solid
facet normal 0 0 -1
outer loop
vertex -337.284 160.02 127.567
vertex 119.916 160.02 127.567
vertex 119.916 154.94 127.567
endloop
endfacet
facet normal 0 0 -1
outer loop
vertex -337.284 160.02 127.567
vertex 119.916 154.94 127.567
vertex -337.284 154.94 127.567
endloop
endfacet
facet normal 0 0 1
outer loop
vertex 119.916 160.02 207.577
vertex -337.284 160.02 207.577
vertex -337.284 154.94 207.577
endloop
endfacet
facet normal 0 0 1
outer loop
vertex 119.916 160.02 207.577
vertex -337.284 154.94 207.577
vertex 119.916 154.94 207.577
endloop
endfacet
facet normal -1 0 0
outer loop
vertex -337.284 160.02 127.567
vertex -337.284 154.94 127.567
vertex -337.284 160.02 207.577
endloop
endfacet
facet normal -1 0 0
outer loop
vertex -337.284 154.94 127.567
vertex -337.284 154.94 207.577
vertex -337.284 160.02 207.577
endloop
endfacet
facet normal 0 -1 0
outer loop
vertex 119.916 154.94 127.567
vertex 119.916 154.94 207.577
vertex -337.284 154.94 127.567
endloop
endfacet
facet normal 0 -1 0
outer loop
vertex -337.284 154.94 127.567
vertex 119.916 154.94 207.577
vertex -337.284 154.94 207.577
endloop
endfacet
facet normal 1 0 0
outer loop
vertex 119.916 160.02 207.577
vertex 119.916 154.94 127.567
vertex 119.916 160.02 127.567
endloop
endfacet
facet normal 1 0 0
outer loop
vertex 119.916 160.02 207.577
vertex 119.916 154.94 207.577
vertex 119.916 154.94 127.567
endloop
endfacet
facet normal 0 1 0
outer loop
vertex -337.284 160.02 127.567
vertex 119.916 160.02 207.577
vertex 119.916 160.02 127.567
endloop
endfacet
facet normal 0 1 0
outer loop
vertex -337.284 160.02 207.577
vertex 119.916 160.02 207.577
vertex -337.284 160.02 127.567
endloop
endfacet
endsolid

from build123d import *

# Parameters (mm, degrees)
SKETCH1_W           = 381
SKETCH1_H           = 381
BOSS_EXTRUDE1_DEPTH = 25.4
FILLET1_R           = 25.4
BOSS_EXTRUDE2_START = 127
BOSS_EXTRUDE2_DEPTH = 127
FILLET5_R           = 2.54
FILLET6_R           = 2.54
SKETCH3_W           = 381
SKETCH3_H           = 45.536829563
BOSS_EXTRUDE3_DEPTH = 127
CUT_EXTRUDE1_START  = -127
CUT_EXTRUDE1_DEPTH  = 127
CUT_EXTRUDE2_START  = -127
CUT_EXTRUDE2_DEPTH  = 127
SKETCH7_W           = 159.592910526
SKETCH7_H           = 279.668363548
CUT_EXTRUDE3_DEPTH  = 540.805557869
CUT_EXTRUDE4_DEPTH  = 121.92
SKETCH10_W          = 12.830407975
SKETCH10_H          = 5.381034355
SKETCH10_W_2        = 12.189915085
SKETCH10_H_2        = 7.553204363
BOSS_EXTRUDE4_DEPTH = 5.08
SKETCH12_W          = 381
SKETCH12_H          = 5.08
BOSS_EXTRUDE5_DEPTH = 5.842
SKETCH14_W          = 25.4
SKETCH14_H          = 25.4
BOSS_EXTRUDE6_DEPTH = 5.08
SKETCH15_W          = 381
SKETCH15_H          = 25.4
BOSS_EXTRUDE7_DEPTH = 2.54
SKETCH18_W          = 25.978829563
SKETCH18_H          = 5.08
CUT_EXTRUDE6_DEPTH  = 463.44511455
SKETCH19_W          = 25.4
SKETCH19_H          = 2.54
CUT_EXTRUDE7_DEPTH  = 463.44511455
SKETCH21_W          = 76.2
SKETCH21_H          = 25.4
BOSS_EXTRUDE8_DEPTH = 5.08
SKETCH22_W          = 457.2
SKETCH22_H          = 5.08
BOSS_EXTRUDE9_DEPTH = 54.61


with BuildPart() as part:
    # Sketch1 → Boss-Extrude1 (new body)
    with BuildSketch(Plane(origin=(0, 0, 0), x_dir=(1, 0, 0), z_dir=(0, 1, 0))):
        with Locations((-70.583665339, -17.076693227)):
            Rectangle(SKETCH1_W, SKETCH1_H)
    extrude(amount=BOSS_EXTRUDE1_DEPTH)

    # Fillet1
    fillet1_edges = [part.edges().sort_by_distance(p)[0] for p in [
        (-261.083665339, 12.7, -173.423306773),
        (119.916334661, 12.7, -173.423306773),
        (119.916334661, 12.7, 207.576693227),
        (-261.083665339, 12.7, 207.576693227),
    ]]
    fillet(fillet1_edges, radius=FILLET1_R)

    # Sketch2 → Boss-Extrude2 (add)
    with BuildSketch(Plane(origin=(0, 25.4, 0), x_dir=(1, 0, 0), z_dir=(0, 1, 0)).offset(BOSS_EXTRUDE2_START)):
        with BuildLine():
            ThreePointArc((94.516334661, -207.576693227), (112.476846903, -200.137205469), (119.916334661, -182.176693227))
            Line((119.916334661, -182.176693227), (119.916334661, -162.77058906))
            ThreePointArc((119.916334661, -162.77058906), (115.157902312, -162.131654008), (110.356896004, -162.096230085))
            Line((110.356896004, -162.096230085), (110.356896004, -169.819933243))
            ThreePointArc((110.356896004, -169.819933243), (110.63661406, -173.531591416), (110.356896004, -177.243249589))
            ThreePointArc((110.356896004, -177.243249589), (103.383001842, -191.043360408), (89.582891024, -198.017254569))
            ThreePointArc((89.582891024, -198.017254569), (85.871232851, -198.296972625), (82.159574678, -198.017254569))
            Line((82.159574678, -198.017254569), (74.435871519, -198.017254569))
            ThreePointArc((74.435871519, -198.017254569), (74.471295442, -202.818260878), (75.110230494, -207.576693227))
            Line((75.110230494, -207.576693227), (94.516334661, -207.576693227))
        make_face()
        with BuildLine():
            ThreePointArc((110.356896004, 127.942843631), (115.157902312, 127.978267553), (119.916334661, 128.617202605))
            Line((119.916334661, 128.617202605), (119.916334661, 148.023306773))
            ThreePointArc((119.916334661, 148.023306773), (112.476846903, 165.983819015), (94.516334661, 173.423306773))
            Line((94.516334661, 173.423306773), (75.110230494, 173.423306773))
            ThreePointArc((75.110230494, 173.423306773), (74.471295442, 168.664874423), (74.435871519, 163.863868115))
            Line((74.435871519, 163.863868115), (82.159574678, 163.863868115))
            ThreePointArc((82.159574678, 163.863868115), (85.871232851, 164.143586171), (89.582891024, 163.863868115))
            ThreePointArc((89.582891024, 163.863868115), (103.383001842, 156.889973954), (110.356896004, 143.089863135))
            ThreePointArc((110.356896004, 143.089863135), (110.63661406, 139.378204962), (110.356896004, 135.666546789))
            Line((110.356896004, 135.666546789), (110.356896004, 127.942843631))
        make_face()
        with BuildLine():
            Line((-235.683665339, -207.576693227), (-216.277561171, -207.576693227))
            ThreePointArc((-216.277561171, -207.576693227), (-215.638626119, -202.818260878), (-215.603202197, -198.017254569))
            Line((-215.603202197, -198.017254569), (-223.326905355, -198.017254569))
            ThreePointArc((-223.326905355, -198.017254569), (-227.038563528, -198.296972625), (-230.750221701, -198.017254569))
            ThreePointArc((-230.750221701, -198.017254569), (-244.55033252, -191.043360408), (-251.524226681, -177.243249589))
            ThreePointArc((-251.524226681, -177.243249589), (-251.803944737, -173.531591416), (-251.524226681, -169.819933243))
            Line((-251.524226681, -169.819933243), (-251.524226681, -162.096230085))
            ThreePointArc((-251.524226681, -162.096230085), (-256.325232989, -162.131654008), (-261.083665339, -162.77058906))
            Line((-261.083665339, -162.77058906), (-261.083665339, -182.176693227))
            ThreePointArc((-261.083665339, -182.176693227), (-253.644177581, -200.137205469), (-235.683665339, -207.576693227))
        make_face()
        with BuildLine():
            ThreePointArc((-215.603202197, 163.863868115), (-215.638626119, 168.664874423), (-216.277561171, 173.423306773))
            Line((-216.277561171, 173.423306773), (-235.683665339, 173.423306773))
            ThreePointArc((-235.683665339, 173.423306773), (-253.644177581, 165.983819015), (-261.083665339, 148.023306773))
            Line((-261.083665339, 148.023306773), (-261.083665339, 128.617202605))
            ThreePointArc((-261.083665339, 128.617202605), (-256.325232989, 127.978267553), (-251.524226681, 127.942843631))
            Line((-251.524226681, 127.942843631), (-251.524226681, 135.666546789))
            ThreePointArc((-251.524226681, 135.666546789), (-251.803944737, 139.378204962), (-251.524226681, 143.089863135))
            ThreePointArc((-251.524226681, 143.089863135), (-244.55033252, 156.889973954), (-230.750221701, 163.863868115))
            ThreePointArc((-230.750221701, 163.863868115), (-227.038563528, 164.143586171), (-223.326905355, 163.863868115))
            Line((-223.326905355, 163.863868115), (-215.603202197, 163.863868115))
        make_face()
    extrude(amount=-BOSS_EXTRUDE2_DEPTH)

    # Fillet5
    fillet5_edges = [part.edges().sort_by_distance(p)[0] for p in [
        (74.435871519, 88.9, -163.863868115),
        (110.356896004, 88.9, -127.942843631),
        (119.916334661, 88.9, -128.617202605),
        (75.110230494, 88.9, -173.423306773),
    ]]
    fillet(fillet5_edges, radius=FILLET5_R)

    # Fillet6
    fillet6_edges = [part.edges().sort_by_distance(p)[0] for p in [
        (-215.603202197, 88.9, -163.863868115),
        (-216.277561171, 88.9, -173.423306773),
        (-261.083665339, 88.9, -128.617202605),
        (-251.524226681, 88.9, -127.942843631),
        (74.435871519, 88.9, 198.017254569),
        (75.110230494, 88.9, 207.576693227),
        (119.916334661, 88.9, 162.77058906),
        (110.356896004, 88.9, 162.096230085),
        (-216.277561171, 88.9, 207.576693227),
        (-215.603202197, 88.9, 198.017254569),
        (-251.524226681, 88.9, 162.096230085),
        (-261.083665339, 88.9, 162.77058906),
    ]]
    fillet(fillet6_edges, radius=FILLET6_R)

    # Sketch3 → Boss-Extrude3 (add)
    with BuildSketch(Plane(origin=(0, 152.4, 0), x_dir=(1, 0, 0), z_dir=(0, 1, 0))):
        with Locations((-70.583665339, -184.808278446)):
            Rectangle(SKETCH3_W, SKETCH3_H)
    extrude(amount=BOSS_EXTRUDE3_DEPTH)

    # Sketch5 → Cut-Extrude1 (cut)
    with BuildSketch(Plane.XZ.offset(-152.4).offset(CUT_EXTRUDE1_START)):
        with BuildLine():
            Line((-261.083665339, 162.039863664), (-261.083665339, 164.916350572))
            ThreePointArc((-261.083665339, 164.916350572), (-260.459455915, 163.248613642), (-258.89362875, 162.400575222))
            ThreePointArc((-258.89362875, 162.400575222), (-256.499630965, 162.144358959), (-254.094230188, 162.039863664))
            Line((-254.094230188, 162.039863664), (-261.083665339, 162.039863664))
        make_face()
        with BuildLine():
            Line((-261.083665339, 207.576693227), (-235.683665339, 207.576693227))
            ThreePointArc((-235.683665339, 207.576693227), (-253.644177581, 200.137205469), (-261.083665339, 182.176693227))
            Line((-261.083665339, 182.176693227), (-261.083665339, 207.576693227))
        make_face()
    extrude(amount=CUT_EXTRUDE1_DEPTH, mode=Mode.SUBTRACT)

    # Sketch6 → Cut-Extrude2 (cut)
    with BuildSketch(Plane.XZ.offset(-152.4).offset(CUT_EXTRUDE2_START)):
        with BuildLine():
            Line((119.916334661, 162.039863664), (112.926899511, 162.039863664))
            ThreePointArc((112.926899511, 162.039863664), (115.332300288, 162.144358959), (117.726298073, 162.400575222))
            ThreePointArc((117.726298073, 162.400575222), (119.292125238, 163.248613642), (119.916334661, 164.916350572))
            Line((119.916334661, 164.916350572), (119.916334661, 162.039863664))
        make_face()
        with BuildLine():
            Line((119.916334661, 207.576693227), (119.916334661, 182.176693227))
            ThreePointArc((119.916334661, 182.176693227), (112.476846903, 200.137205469), (94.516334661, 207.576693227))
            Line((94.516334661, 207.576693227), (119.916334661, 207.576693227))
        make_face()
    extrude(amount=CUT_EXTRUDE2_DEPTH, mode=Mode.SUBTRACT)

    # Sketch7 → Cut-Extrude3 (cut, through all)
    with BuildSketch(Plane.XY.offset(207.576693227)):
        with Locations((-277.192611624, 12.565818226)):
            Rectangle(SKETCH7_W, SKETCH7_H)
        Polygon((188.205407311, 152.4), (-197.396156361, 152.4), (-197.396156361, -127.268363548), (-197.396156361, -138.930106511), (188.205407311, -138.930106511), align=None)
    extrude(amount=-CUT_EXTRUDE3_DEPTH, mode=Mode.SUBTRACT)

    # Sketch9 → Cut-Extrude4 (cut)
    with BuildSketch(Plane(origin=(0, 279.4, 0), x_dir=(1, 0, 0), z_dir=(0, 1, 0))):
        with BuildLine():
            Line((112.926899511, -162.039863664), (-254.094230188, -162.039863664))
            ThreePointArc((-254.094230188, -162.039863664), (-256.499630965, -162.144358959), (-258.89362875, -162.400575222))
            ThreePointArc((-258.89362875, -162.400575222), (-260.459455915, -163.248613642), (-261.083665339, -164.916350572))
            Line((-261.083665339, -164.916350572), (-261.083665339, -182.176693227))
            ThreePointArc((-261.083665339, -182.176693227), (-253.644177581, -200.137205469), (-235.683665339, -207.576693227))
            Line((-235.683665339, -207.576693227), (94.516334661, -207.576693227))
            ThreePointArc((94.516334661, -207.576693227), (112.476846903, -200.137205469), (119.916334661, -182.176693227))
            Line((119.916334661, -182.176693227), (119.916334661, -164.916350572))
            ThreePointArc((119.916334661, -164.916350572), (119.292125238, -163.248613642), (117.726298073, -162.400575222))
            ThreePointArc((117.726298073, -162.400575222), (115.332300288, -162.144358959), (112.926899511, -162.039863664))
        make_face()
    extrude(amount=-CUT_EXTRUDE4_DEPTH, mode=Mode.SUBTRACT)

    # Sketch10 → Boss-Extrude4 (add)
    with BuildSketch(Plane(origin=(0, 157.48, 0), x_dir=(1, 0, 0), z_dir=(0, 1, 0))):
        with Locations((-254.668461352, -164.730380842)):
            Rectangle(SKETCH10_W, SKETCH10_H)
        with Locations((113.821377119, -165.816465846)):
            Rectangle(SKETCH10_W_2, SKETCH10_H_2)
    extrude(amount=-BOSS_EXTRUDE4_DEPTH)

    # Sketch12 → Boss-Extrude5 (add)
    with BuildSketch(Plane(origin=(0, 0, 162.039863664), x_dir=(-1, 0, 0), z_dir=(0, 0, -1))):
        with Locations((70.583665339, 154.94)):
            Rectangle(SKETCH12_W, SKETCH12_H)
    extrude(amount=BOSS_EXTRUDE5_DEPTH)

    # Sketch14 → Boss-Extrude6 (add)
    with BuildSketch(Plane(origin=(0, 157.48, 0), x_dir=(1, 0, 0), z_dir=(0, 1, 0))):
        with Locations((107.216334661, -194.876693227)):
            Rectangle(SKETCH14_W, SKETCH14_H)
        with Locations((-248.383665339, -194.876693227)):
            Rectangle(SKETCH14_W, SKETCH14_H)
    extrude(amount=-BOSS_EXTRUDE6_DEPTH)

    # Sketch15 → Boss-Extrude7 (add)
    with BuildSketch(Plane(origin=(0, 157.48, 0), x_dir=(1, 0, 0), z_dir=(0, 1, 0))):
        with Locations((-70.583665339, -194.876693227)):
            Rectangle(SKETCH15_W, SKETCH15_H)
    extrude(amount=BOSS_EXTRUDE7_DEPTH)

    # Sketch18 → Cut-Extrude6 (cut, through all)
    with BuildSketch(Plane.ZY.offset(261.083665339)):
        with Locations((169.187278445, 154.94)):
            Rectangle(SKETCH18_W, SKETCH18_H)
    extrude(amount=-CUT_EXTRUDE6_DEPTH, mode=Mode.SUBTRACT)

    # Sketch19 → Cut-Extrude7 (cut, through all)
    with BuildSketch(Plane.ZY.offset(261.083665339)):
        with Locations((194.876693227, 153.67)):
            Rectangle(SKETCH19_W, SKETCH19_H)
    extrude(amount=-CUT_EXTRUDE7_DEPTH, mode=Mode.SUBTRACT)

    # Sketch21 → Boss-Extrude8 (add)
    with BuildSketch(Plane(origin=(0, 160.02, 0), x_dir=(1, 0, 0), z_dir=(0, 1, 0))):
        with Locations((-299.183665339, -194.876693227)):
            Rectangle(SKETCH21_W, SKETCH21_H)
    extrude(amount=-BOSS_EXTRUDE8_DEPTH)

    # Sketch22 → Boss-Extrude9 (add)
    with BuildSketch(Plane(origin=(0, 0, 182.176693227), x_dir=(-1, 0, 0), z_dir=(0, 0, -1))):
        with Locations((108.683665339, 157.48)):
            Rectangle(SKETCH22_W, SKETCH22_H)
    extrude(amount=BOSS_EXTRUDE9_DEPTH)


solid = part.part
